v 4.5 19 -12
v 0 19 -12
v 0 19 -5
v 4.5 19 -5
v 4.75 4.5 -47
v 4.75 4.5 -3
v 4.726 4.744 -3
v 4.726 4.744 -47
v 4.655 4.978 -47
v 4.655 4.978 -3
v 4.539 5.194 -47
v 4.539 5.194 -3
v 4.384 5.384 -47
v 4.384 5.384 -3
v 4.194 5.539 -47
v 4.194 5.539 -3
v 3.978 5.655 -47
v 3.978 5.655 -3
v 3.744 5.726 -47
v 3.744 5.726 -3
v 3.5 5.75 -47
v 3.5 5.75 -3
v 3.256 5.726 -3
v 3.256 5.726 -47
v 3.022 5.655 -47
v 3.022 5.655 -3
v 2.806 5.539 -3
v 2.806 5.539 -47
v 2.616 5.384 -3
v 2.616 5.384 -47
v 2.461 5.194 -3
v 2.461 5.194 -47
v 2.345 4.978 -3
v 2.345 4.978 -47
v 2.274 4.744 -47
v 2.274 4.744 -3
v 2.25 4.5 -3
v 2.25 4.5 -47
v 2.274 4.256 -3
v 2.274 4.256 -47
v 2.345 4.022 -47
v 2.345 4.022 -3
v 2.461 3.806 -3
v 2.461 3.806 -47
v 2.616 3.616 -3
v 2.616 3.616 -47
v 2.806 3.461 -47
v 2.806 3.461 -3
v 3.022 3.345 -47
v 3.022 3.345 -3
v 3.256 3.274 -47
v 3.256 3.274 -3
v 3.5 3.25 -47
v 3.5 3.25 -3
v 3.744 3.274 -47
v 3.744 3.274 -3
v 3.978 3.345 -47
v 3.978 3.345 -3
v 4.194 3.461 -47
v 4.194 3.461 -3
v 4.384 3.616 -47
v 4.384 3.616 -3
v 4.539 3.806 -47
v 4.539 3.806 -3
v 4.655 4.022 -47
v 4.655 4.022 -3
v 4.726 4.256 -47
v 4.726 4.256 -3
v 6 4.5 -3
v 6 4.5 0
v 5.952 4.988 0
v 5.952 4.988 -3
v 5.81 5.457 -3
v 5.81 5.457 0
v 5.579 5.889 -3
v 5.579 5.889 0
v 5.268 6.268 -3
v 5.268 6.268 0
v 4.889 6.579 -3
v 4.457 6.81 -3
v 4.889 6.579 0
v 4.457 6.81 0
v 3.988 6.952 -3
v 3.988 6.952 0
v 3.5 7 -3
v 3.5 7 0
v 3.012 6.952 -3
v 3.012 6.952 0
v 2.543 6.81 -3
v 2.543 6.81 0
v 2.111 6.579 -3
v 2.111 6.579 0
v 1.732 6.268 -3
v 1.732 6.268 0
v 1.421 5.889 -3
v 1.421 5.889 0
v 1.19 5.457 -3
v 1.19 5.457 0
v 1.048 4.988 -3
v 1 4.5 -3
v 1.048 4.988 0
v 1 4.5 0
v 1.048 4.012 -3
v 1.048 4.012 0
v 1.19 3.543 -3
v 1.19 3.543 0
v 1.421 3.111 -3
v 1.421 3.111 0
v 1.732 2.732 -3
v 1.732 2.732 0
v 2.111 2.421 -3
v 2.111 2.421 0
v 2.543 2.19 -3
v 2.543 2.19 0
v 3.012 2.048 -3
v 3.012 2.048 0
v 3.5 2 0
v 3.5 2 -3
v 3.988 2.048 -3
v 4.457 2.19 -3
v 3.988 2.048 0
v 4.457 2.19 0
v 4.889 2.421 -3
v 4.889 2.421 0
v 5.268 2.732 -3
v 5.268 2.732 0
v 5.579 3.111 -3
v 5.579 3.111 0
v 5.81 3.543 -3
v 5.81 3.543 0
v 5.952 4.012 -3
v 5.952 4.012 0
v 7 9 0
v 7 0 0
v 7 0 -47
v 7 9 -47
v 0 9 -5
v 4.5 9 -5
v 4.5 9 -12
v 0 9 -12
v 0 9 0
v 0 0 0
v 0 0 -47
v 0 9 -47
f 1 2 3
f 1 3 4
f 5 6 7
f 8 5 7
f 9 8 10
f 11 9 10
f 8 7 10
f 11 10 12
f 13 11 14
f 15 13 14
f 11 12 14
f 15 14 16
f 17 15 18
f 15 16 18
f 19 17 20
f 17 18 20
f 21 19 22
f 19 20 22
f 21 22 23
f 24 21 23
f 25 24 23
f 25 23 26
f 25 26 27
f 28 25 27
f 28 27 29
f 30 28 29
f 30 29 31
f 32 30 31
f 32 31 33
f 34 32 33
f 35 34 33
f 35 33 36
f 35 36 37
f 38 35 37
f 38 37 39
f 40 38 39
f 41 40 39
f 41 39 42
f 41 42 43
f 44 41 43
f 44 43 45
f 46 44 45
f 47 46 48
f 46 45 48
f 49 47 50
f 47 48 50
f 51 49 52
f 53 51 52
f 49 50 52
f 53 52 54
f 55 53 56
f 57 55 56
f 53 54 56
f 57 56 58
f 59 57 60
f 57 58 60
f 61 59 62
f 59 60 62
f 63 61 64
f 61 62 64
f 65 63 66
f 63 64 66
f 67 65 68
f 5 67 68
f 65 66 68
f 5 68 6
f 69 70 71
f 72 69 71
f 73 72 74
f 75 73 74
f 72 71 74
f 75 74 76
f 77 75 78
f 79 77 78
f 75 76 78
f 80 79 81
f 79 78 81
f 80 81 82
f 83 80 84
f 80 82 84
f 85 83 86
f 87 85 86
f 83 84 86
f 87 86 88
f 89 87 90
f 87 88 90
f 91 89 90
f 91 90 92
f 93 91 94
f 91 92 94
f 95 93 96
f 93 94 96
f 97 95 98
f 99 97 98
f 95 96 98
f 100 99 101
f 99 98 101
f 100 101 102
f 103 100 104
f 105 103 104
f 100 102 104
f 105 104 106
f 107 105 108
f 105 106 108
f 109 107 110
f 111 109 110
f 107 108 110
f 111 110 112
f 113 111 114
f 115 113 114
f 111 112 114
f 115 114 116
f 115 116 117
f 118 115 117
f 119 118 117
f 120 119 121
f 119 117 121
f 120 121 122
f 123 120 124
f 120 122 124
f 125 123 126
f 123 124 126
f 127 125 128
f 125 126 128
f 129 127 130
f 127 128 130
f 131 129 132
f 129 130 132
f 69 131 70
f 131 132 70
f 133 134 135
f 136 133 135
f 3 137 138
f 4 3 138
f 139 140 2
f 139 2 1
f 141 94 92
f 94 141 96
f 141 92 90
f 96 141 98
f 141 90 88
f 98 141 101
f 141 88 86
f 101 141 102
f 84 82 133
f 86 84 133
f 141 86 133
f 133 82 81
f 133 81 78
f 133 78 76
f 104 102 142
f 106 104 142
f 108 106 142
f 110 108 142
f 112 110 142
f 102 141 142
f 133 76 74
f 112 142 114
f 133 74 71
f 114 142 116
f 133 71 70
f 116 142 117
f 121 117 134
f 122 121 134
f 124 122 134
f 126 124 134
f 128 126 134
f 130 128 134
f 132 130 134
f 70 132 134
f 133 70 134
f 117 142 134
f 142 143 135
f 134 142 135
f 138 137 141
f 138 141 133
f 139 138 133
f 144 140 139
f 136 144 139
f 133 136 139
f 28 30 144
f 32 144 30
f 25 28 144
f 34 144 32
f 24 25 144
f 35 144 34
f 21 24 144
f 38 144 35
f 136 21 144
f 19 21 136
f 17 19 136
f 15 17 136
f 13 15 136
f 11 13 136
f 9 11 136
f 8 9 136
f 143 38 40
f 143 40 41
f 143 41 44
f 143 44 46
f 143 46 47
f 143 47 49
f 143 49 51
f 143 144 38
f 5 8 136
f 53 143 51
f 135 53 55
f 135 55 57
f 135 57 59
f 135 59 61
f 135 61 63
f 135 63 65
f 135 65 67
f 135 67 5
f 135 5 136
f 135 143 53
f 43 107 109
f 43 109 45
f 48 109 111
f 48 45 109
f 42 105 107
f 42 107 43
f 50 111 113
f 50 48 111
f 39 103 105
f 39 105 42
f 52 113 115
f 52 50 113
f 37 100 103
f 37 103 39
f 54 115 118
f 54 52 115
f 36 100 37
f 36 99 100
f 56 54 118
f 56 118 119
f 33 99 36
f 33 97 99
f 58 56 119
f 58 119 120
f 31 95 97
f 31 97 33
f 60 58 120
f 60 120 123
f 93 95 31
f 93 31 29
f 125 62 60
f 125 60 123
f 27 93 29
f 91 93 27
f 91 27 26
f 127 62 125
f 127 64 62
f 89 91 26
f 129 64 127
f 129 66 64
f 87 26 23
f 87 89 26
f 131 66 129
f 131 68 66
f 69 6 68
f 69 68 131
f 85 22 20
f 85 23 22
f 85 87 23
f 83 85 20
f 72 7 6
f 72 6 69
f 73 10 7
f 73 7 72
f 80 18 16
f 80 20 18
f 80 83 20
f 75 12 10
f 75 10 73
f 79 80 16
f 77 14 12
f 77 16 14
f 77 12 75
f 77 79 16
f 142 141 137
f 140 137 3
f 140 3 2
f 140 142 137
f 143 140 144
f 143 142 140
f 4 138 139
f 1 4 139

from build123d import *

# Parameters (mm, degrees)
CROQUIS1_W              = 7
CROQUIS1_H              = 47
SALIENTE_EXTRUIR1_DEPTH = 9
CROQUIS2_W              = 4.5
CROQUIS2_H              = 7
SALIENTE_EXTRUIR2_DEPTH = 10
CROQUIS3_R              = 1.25
CORTAR_EXTRUIR1_DEPTH   = 49
CROQUIS6_R              = 2.5
CORTAR_EXTRUIR2_DEPTH   = 3


with BuildPart() as part:
    # Croquis1 → Saliente-Extruir1 (new body)
    with BuildSketch(Plane(origin=(0, 0, 0), x_dir=(1, 0, 0), z_dir=(0, 1, 0))):
        with Locations((3.5, 23.5)):
            Rectangle(CROQUIS1_W, CROQUIS1_H)
    extrude(amount=SALIENTE_EXTRUIR1_DEPTH)

    # Croquis2 → Saliente-Extruir2 (add)
    with BuildSketch(Plane(origin=(0, 9, 0), x_dir=(1, 0, 0), z_dir=(0, 1, 0))):
        with Locations((2.25, 8.5)):
            Rectangle(CROQUIS2_W, CROQUIS2_H)
    extrude(amount=SALIENTE_EXTRUIR2_DEPTH)

    # Croquis3 → Cortar-Extruir1 (cut)
    with BuildSketch(Plane.XY):
        with Locations((3.5, 4.5)):
            Circle(CROQUIS3_R)
    extrude(amount=-CORTAR_EXTRUIR1_DEPTH, mode=Mode.SUBTRACT)

    # Croquis6 → Cortar-Extruir2 (cut)
    with BuildSketch(Plane.XY):
        with Locations((3.5, 4.5)):
            Circle(CROQUIS6_R)
    extrude(amount=-CORTAR_EXTRUIR2_DEPTH, mode=Mode.SUBTRACT)


solid = part.part
